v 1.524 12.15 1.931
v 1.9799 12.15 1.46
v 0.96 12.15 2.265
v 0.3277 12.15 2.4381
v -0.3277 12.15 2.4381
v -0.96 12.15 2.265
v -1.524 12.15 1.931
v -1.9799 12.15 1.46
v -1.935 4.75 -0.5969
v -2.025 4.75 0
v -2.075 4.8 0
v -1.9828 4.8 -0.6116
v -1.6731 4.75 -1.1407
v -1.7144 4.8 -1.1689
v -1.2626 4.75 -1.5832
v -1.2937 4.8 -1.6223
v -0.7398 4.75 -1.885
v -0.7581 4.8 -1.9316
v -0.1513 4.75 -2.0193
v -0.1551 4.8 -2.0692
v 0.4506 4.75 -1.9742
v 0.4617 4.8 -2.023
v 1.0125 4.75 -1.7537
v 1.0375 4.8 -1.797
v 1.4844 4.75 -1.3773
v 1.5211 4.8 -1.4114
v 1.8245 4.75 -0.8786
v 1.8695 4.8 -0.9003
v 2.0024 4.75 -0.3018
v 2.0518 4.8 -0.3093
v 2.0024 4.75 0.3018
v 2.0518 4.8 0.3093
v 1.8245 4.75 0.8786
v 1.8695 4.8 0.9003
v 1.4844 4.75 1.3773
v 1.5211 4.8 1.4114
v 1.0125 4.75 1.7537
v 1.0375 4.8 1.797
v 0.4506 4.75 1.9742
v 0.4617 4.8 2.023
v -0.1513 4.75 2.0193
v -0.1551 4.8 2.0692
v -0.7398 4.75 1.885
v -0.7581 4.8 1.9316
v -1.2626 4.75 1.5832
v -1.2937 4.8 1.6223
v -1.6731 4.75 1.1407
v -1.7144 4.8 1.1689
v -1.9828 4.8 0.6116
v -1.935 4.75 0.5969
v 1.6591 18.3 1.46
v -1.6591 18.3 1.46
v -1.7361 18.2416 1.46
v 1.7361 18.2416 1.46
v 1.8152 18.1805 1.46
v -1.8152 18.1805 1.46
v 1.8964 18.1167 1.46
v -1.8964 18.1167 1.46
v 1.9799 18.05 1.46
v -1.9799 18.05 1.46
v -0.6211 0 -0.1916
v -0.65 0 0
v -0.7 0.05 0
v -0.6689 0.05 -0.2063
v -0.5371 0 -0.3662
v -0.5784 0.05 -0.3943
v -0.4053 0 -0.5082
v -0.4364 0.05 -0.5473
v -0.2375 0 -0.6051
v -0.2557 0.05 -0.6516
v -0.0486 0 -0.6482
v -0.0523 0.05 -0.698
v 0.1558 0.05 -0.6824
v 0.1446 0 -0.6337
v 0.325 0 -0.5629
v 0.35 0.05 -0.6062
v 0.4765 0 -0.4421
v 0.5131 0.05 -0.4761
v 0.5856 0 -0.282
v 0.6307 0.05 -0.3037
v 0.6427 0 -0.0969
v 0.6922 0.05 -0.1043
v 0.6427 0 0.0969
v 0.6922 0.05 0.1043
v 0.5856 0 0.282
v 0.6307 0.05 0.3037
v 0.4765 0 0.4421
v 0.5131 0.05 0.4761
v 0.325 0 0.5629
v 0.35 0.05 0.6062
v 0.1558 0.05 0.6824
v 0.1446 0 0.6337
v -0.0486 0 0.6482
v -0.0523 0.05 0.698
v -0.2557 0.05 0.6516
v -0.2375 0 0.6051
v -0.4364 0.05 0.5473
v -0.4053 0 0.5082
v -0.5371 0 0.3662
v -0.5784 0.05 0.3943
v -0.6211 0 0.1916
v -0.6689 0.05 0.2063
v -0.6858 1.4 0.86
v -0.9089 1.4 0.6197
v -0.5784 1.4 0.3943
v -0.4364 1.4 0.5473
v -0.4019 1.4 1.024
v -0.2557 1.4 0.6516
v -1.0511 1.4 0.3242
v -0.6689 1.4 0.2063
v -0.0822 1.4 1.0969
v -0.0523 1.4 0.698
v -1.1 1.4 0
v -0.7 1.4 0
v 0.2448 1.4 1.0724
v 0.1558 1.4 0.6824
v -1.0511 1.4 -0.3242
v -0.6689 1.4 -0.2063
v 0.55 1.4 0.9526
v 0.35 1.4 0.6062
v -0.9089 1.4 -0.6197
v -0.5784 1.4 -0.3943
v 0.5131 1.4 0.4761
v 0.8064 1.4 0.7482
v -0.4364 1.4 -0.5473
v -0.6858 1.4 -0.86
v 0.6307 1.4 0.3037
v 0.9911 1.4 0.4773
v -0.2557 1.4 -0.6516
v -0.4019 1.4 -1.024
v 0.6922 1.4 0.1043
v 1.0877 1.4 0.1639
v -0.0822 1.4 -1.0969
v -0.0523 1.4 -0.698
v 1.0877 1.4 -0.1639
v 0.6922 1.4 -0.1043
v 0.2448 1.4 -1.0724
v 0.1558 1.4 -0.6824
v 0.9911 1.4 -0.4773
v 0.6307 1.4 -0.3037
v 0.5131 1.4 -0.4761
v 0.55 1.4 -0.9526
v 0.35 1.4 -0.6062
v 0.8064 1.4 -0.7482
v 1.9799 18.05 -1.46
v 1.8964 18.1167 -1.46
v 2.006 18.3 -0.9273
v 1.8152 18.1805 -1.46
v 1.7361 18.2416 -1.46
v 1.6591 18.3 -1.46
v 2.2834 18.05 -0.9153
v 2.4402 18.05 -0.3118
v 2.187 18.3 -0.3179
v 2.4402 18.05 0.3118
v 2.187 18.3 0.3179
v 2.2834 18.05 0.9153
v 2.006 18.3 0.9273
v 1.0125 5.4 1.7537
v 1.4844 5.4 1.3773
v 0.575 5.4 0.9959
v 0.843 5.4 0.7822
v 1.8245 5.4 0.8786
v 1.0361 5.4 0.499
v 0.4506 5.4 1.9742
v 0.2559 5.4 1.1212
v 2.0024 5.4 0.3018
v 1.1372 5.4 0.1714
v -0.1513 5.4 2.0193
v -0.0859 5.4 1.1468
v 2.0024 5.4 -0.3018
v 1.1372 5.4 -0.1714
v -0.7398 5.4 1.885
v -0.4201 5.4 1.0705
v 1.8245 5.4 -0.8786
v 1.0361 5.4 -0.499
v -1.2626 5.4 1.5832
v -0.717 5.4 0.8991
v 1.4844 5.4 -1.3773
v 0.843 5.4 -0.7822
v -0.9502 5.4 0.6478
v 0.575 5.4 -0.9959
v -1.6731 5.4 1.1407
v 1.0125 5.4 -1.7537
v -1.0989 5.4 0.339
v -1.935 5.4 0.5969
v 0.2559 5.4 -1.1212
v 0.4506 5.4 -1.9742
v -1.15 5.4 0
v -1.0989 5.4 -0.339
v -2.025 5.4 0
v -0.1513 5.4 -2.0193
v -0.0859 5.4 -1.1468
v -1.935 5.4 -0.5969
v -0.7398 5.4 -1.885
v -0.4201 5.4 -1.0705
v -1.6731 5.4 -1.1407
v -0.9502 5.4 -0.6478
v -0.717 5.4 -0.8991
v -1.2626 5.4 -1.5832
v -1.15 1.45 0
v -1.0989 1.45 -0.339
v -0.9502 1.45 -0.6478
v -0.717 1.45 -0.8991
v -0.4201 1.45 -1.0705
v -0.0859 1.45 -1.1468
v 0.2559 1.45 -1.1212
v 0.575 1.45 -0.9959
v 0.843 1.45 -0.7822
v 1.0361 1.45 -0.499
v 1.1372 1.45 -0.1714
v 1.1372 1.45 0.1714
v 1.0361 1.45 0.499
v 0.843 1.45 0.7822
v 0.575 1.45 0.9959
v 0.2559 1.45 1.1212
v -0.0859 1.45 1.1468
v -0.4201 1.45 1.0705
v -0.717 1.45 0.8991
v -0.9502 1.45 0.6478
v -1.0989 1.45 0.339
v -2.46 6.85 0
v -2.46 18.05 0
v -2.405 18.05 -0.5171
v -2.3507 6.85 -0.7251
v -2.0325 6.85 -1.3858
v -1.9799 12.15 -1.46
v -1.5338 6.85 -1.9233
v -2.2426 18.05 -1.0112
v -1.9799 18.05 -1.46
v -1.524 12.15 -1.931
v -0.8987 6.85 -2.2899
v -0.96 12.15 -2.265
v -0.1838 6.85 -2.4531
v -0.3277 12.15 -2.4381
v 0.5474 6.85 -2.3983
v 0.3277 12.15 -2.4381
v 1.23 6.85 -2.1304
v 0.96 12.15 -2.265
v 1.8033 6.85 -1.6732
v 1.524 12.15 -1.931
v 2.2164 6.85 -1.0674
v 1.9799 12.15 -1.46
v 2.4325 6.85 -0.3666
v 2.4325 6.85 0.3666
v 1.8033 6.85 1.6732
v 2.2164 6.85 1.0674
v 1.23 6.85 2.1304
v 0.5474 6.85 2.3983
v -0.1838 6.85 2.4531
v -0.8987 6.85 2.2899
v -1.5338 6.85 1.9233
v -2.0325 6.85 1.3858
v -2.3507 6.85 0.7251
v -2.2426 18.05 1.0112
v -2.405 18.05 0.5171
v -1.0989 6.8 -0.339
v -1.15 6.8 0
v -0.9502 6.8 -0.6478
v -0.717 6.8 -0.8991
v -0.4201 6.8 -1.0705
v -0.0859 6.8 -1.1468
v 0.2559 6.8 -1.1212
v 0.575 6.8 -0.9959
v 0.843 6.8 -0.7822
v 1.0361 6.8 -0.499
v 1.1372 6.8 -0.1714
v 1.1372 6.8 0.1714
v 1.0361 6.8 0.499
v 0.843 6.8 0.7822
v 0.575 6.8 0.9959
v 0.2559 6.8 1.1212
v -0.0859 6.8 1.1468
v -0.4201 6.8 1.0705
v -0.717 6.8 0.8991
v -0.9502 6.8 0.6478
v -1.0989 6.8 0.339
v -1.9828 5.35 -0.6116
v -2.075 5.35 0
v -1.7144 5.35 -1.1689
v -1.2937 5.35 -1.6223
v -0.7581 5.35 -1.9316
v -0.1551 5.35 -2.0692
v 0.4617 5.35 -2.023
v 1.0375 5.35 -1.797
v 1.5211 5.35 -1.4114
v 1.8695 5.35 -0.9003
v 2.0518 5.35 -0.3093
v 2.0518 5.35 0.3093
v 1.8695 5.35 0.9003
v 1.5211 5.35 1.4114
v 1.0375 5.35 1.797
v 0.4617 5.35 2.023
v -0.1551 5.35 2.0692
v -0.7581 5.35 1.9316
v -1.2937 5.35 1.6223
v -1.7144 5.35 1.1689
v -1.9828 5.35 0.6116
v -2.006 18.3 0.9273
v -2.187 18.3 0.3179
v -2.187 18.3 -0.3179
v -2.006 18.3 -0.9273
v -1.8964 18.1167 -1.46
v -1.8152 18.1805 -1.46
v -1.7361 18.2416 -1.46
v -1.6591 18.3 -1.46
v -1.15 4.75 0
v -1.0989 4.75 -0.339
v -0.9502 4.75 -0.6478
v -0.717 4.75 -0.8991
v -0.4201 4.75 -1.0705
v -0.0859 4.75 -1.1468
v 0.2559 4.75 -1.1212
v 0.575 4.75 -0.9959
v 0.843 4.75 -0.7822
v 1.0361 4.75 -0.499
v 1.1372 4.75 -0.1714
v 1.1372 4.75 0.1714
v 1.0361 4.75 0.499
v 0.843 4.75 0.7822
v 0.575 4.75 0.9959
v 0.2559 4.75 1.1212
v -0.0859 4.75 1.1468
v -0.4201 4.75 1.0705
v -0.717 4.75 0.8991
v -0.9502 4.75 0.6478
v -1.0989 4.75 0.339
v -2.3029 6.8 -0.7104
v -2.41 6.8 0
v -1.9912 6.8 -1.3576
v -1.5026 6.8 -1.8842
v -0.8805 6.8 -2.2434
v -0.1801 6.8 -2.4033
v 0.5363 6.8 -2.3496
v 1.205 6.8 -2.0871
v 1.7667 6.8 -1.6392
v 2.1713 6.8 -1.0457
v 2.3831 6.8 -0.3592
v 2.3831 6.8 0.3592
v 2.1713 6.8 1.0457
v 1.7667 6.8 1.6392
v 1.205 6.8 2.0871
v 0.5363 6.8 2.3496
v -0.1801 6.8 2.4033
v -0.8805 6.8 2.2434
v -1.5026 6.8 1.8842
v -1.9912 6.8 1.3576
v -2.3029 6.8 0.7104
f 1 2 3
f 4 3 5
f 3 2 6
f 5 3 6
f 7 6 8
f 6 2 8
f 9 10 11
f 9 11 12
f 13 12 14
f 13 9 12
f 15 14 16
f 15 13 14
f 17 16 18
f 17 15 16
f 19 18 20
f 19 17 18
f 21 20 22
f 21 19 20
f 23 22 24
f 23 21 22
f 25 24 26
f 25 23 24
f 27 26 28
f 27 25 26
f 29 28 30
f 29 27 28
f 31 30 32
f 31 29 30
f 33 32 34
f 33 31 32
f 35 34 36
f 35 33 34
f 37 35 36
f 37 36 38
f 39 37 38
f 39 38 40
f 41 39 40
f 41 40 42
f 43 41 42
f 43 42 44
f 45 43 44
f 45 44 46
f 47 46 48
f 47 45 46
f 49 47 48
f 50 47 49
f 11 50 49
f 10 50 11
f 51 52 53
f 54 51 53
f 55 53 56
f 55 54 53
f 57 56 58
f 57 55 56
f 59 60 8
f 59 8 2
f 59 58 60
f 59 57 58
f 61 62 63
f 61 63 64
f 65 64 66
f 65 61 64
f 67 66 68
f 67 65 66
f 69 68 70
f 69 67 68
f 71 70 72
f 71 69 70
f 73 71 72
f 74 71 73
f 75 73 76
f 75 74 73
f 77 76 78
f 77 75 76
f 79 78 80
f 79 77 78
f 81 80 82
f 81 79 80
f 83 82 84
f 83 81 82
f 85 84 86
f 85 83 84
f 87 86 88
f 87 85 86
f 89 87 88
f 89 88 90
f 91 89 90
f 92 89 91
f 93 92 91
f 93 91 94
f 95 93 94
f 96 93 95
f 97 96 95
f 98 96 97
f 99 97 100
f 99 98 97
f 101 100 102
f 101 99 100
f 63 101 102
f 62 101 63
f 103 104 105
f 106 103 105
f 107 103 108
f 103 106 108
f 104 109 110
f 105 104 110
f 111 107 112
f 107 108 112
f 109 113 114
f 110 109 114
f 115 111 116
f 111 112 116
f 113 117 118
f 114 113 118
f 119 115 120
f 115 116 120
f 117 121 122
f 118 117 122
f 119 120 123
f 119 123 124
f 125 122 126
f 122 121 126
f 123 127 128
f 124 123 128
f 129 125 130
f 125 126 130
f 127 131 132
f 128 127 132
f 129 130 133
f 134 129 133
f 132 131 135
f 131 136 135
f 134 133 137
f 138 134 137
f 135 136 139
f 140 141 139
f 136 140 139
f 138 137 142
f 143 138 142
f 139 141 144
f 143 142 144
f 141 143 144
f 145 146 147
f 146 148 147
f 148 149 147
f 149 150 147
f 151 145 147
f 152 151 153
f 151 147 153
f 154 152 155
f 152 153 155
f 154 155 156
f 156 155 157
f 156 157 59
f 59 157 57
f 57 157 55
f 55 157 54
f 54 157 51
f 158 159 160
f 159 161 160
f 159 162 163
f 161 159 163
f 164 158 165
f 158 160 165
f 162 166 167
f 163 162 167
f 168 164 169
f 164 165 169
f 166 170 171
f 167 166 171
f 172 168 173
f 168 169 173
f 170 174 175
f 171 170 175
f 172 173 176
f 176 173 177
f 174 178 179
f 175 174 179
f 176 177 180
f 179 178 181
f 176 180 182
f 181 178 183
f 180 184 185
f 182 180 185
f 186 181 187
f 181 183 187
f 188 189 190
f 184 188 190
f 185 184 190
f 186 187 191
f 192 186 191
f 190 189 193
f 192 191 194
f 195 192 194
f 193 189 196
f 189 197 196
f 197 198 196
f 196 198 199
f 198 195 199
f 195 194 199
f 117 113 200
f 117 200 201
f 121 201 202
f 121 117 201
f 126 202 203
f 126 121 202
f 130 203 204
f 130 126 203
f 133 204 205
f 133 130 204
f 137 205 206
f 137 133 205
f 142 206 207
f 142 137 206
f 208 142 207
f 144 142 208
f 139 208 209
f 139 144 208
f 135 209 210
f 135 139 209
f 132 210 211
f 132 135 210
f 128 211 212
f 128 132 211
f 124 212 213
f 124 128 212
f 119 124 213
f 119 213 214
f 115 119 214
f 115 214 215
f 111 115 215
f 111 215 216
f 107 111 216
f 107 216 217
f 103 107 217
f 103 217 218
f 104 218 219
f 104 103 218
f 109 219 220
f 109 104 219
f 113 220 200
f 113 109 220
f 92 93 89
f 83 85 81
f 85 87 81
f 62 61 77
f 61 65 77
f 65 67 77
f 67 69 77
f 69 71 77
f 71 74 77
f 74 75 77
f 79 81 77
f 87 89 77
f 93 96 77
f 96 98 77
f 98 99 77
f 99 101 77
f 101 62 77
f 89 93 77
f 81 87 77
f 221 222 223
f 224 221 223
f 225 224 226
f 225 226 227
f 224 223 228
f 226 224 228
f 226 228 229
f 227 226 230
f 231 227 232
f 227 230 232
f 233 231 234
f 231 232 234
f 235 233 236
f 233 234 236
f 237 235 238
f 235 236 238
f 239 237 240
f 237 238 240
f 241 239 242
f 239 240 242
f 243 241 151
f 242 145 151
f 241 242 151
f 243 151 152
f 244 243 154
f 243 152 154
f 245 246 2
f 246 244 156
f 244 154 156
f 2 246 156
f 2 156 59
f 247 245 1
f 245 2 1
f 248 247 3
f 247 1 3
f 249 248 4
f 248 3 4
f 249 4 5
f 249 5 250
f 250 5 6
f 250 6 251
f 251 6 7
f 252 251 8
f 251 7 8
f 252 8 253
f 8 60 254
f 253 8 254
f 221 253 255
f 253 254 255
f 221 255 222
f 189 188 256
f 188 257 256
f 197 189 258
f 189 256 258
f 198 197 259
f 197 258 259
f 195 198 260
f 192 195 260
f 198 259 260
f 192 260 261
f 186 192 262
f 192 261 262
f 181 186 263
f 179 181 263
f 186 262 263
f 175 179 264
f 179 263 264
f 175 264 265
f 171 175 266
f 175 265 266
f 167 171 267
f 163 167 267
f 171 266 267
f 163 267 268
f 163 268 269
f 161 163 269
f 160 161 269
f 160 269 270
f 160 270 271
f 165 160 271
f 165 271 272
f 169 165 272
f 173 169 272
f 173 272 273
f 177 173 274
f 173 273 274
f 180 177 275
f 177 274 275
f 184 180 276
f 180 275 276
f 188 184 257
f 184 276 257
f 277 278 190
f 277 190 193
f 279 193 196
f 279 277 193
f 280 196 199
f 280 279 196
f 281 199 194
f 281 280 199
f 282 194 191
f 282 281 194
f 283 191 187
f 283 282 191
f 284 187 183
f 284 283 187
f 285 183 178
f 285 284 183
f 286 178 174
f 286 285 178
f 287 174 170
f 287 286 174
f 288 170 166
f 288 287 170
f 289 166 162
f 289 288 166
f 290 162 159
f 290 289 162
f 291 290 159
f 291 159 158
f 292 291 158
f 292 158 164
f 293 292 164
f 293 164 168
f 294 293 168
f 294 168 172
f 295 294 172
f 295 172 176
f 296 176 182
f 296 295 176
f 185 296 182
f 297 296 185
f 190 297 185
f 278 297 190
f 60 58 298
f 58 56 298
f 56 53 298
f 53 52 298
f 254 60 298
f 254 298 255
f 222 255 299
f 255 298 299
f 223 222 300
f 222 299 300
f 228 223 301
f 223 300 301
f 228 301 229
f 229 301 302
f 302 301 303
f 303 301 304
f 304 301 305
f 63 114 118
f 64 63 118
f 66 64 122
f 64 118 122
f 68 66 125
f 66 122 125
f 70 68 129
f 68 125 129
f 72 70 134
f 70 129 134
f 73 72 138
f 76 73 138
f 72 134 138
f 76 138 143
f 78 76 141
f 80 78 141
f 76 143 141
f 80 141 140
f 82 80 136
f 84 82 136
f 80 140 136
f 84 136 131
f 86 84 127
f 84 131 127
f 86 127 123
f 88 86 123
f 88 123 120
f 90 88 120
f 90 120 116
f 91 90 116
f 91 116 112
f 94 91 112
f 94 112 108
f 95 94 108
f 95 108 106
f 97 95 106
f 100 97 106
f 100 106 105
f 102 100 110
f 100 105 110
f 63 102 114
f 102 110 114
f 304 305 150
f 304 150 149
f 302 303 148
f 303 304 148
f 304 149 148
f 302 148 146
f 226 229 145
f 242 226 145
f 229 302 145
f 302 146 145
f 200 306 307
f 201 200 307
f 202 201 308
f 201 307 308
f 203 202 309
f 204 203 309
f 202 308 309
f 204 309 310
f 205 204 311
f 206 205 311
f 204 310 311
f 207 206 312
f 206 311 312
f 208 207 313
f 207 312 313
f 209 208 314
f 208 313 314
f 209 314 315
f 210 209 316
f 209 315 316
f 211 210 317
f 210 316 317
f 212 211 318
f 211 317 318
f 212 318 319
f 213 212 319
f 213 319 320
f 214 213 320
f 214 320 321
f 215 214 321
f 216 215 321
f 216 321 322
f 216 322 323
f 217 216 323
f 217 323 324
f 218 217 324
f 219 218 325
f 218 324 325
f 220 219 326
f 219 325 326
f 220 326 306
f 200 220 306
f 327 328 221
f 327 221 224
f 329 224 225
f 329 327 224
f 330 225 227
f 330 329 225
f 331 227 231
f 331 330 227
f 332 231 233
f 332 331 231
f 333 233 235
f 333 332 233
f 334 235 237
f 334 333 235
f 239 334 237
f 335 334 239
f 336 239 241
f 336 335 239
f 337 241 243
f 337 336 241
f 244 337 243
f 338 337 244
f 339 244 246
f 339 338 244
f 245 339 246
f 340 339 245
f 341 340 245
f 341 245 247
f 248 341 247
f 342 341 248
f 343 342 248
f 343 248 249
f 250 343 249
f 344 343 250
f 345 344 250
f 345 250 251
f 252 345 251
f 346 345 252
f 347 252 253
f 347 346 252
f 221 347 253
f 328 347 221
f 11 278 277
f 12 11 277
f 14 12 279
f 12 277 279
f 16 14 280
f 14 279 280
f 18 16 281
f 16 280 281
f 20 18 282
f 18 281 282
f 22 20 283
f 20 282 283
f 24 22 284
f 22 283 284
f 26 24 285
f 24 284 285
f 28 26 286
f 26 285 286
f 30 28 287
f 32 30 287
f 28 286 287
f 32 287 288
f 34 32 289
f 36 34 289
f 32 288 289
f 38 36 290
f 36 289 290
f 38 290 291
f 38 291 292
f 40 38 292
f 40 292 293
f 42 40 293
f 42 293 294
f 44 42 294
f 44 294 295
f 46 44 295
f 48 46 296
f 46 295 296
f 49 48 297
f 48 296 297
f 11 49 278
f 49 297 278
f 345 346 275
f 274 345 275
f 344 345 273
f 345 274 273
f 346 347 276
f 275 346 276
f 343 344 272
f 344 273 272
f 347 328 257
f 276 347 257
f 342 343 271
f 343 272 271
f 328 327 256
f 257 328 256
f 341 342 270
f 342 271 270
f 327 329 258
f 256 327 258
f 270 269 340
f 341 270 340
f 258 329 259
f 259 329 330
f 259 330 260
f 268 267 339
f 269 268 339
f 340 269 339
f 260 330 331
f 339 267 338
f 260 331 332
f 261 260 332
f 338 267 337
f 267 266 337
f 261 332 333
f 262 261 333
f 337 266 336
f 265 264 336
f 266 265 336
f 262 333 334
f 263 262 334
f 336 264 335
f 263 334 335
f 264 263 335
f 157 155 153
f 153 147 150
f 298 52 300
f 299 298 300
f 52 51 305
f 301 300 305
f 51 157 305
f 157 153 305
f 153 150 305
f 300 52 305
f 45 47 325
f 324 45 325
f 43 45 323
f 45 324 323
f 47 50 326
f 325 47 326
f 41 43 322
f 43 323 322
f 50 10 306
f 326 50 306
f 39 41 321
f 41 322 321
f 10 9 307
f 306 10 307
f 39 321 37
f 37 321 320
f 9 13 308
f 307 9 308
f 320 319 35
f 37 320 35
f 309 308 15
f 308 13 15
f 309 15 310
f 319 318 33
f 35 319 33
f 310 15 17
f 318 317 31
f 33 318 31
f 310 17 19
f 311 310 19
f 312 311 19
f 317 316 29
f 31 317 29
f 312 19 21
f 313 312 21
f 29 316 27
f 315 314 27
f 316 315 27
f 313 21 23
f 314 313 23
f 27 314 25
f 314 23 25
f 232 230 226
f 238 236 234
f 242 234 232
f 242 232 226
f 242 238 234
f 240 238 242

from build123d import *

# Parameters (mm, degrees)
CUT_EXTRUDE_1_DEPTH = 6.15
CHAMFER_1_SIZE      = 0.25
CHAMFER_2_SIZE      = 0.05


with BuildPart() as part:
    # Эскиз1 → Повернуть1 (revolve)
    with BuildSketch(Plane.XY):
        Polygon((0, 18.3), (0, 0), (-0.7, 0), (-0.7, 1.4), (-1.15, 1.4), (-1.15, 4.75), (-2.075, 4.75), (-2.075, 5.4), (-1.15, 5.4), (-1.15, 6.8), (-2.46, 6.8), (-2.46, 18.3), align=None)
    revolve(axis=Axis((0, 18.3, 0), (0, -1, 0)))

    # Эскиз2 → Вырез-Вытянуть1 (cut)
    with BuildSketch(Plane(origin=(0, 18.3, 0), x_dir=(1, 0, 0), z_dir=(0, 1, 0))):
        with BuildLine():
            Line((-1.979898987, 1.46), (1.979898987, 1.46))
            ThreePointArc((1.979898987, 1.46), (0, 2.46), (-1.979898987, 1.46))
        make_face()
        with BuildLine():
            Line((-1.979898987, -1.46), (1.979898987, -1.46))
            ThreePointArc((1.979898987, -1.46), (0, -2.46), (-1.979898987, -1.46))
        make_face()
    extrude(amount=-CUT_EXTRUDE_1_DEPTH, mode=Mode.SUBTRACT)

    # Фаска1
    chamfer_1_edges = [part.edges().sort_by_distance(p)[0] for p in [
        (-2.336894468, 18.3, -0.768455754),
        (2.46, 18.3, 0),
    ]]
    chamfer(chamfer_1_edges, length=CHAMFER_1_SIZE)

    # Фаска2
    chamfer_2_edges = [part.edges().sort_by_distance(p)[0] for p in [
        (2.075, 5.4, 0),
        (2.075, 4.75, 0),
        (1.15, 1.4, 0),
        (0.7, 0, 0),
        (2.46, 6.8, 0),
    ]]
    chamfer(chamfer_2_edges, length=CHAMFER_2_SIZE)


solid = part.part
